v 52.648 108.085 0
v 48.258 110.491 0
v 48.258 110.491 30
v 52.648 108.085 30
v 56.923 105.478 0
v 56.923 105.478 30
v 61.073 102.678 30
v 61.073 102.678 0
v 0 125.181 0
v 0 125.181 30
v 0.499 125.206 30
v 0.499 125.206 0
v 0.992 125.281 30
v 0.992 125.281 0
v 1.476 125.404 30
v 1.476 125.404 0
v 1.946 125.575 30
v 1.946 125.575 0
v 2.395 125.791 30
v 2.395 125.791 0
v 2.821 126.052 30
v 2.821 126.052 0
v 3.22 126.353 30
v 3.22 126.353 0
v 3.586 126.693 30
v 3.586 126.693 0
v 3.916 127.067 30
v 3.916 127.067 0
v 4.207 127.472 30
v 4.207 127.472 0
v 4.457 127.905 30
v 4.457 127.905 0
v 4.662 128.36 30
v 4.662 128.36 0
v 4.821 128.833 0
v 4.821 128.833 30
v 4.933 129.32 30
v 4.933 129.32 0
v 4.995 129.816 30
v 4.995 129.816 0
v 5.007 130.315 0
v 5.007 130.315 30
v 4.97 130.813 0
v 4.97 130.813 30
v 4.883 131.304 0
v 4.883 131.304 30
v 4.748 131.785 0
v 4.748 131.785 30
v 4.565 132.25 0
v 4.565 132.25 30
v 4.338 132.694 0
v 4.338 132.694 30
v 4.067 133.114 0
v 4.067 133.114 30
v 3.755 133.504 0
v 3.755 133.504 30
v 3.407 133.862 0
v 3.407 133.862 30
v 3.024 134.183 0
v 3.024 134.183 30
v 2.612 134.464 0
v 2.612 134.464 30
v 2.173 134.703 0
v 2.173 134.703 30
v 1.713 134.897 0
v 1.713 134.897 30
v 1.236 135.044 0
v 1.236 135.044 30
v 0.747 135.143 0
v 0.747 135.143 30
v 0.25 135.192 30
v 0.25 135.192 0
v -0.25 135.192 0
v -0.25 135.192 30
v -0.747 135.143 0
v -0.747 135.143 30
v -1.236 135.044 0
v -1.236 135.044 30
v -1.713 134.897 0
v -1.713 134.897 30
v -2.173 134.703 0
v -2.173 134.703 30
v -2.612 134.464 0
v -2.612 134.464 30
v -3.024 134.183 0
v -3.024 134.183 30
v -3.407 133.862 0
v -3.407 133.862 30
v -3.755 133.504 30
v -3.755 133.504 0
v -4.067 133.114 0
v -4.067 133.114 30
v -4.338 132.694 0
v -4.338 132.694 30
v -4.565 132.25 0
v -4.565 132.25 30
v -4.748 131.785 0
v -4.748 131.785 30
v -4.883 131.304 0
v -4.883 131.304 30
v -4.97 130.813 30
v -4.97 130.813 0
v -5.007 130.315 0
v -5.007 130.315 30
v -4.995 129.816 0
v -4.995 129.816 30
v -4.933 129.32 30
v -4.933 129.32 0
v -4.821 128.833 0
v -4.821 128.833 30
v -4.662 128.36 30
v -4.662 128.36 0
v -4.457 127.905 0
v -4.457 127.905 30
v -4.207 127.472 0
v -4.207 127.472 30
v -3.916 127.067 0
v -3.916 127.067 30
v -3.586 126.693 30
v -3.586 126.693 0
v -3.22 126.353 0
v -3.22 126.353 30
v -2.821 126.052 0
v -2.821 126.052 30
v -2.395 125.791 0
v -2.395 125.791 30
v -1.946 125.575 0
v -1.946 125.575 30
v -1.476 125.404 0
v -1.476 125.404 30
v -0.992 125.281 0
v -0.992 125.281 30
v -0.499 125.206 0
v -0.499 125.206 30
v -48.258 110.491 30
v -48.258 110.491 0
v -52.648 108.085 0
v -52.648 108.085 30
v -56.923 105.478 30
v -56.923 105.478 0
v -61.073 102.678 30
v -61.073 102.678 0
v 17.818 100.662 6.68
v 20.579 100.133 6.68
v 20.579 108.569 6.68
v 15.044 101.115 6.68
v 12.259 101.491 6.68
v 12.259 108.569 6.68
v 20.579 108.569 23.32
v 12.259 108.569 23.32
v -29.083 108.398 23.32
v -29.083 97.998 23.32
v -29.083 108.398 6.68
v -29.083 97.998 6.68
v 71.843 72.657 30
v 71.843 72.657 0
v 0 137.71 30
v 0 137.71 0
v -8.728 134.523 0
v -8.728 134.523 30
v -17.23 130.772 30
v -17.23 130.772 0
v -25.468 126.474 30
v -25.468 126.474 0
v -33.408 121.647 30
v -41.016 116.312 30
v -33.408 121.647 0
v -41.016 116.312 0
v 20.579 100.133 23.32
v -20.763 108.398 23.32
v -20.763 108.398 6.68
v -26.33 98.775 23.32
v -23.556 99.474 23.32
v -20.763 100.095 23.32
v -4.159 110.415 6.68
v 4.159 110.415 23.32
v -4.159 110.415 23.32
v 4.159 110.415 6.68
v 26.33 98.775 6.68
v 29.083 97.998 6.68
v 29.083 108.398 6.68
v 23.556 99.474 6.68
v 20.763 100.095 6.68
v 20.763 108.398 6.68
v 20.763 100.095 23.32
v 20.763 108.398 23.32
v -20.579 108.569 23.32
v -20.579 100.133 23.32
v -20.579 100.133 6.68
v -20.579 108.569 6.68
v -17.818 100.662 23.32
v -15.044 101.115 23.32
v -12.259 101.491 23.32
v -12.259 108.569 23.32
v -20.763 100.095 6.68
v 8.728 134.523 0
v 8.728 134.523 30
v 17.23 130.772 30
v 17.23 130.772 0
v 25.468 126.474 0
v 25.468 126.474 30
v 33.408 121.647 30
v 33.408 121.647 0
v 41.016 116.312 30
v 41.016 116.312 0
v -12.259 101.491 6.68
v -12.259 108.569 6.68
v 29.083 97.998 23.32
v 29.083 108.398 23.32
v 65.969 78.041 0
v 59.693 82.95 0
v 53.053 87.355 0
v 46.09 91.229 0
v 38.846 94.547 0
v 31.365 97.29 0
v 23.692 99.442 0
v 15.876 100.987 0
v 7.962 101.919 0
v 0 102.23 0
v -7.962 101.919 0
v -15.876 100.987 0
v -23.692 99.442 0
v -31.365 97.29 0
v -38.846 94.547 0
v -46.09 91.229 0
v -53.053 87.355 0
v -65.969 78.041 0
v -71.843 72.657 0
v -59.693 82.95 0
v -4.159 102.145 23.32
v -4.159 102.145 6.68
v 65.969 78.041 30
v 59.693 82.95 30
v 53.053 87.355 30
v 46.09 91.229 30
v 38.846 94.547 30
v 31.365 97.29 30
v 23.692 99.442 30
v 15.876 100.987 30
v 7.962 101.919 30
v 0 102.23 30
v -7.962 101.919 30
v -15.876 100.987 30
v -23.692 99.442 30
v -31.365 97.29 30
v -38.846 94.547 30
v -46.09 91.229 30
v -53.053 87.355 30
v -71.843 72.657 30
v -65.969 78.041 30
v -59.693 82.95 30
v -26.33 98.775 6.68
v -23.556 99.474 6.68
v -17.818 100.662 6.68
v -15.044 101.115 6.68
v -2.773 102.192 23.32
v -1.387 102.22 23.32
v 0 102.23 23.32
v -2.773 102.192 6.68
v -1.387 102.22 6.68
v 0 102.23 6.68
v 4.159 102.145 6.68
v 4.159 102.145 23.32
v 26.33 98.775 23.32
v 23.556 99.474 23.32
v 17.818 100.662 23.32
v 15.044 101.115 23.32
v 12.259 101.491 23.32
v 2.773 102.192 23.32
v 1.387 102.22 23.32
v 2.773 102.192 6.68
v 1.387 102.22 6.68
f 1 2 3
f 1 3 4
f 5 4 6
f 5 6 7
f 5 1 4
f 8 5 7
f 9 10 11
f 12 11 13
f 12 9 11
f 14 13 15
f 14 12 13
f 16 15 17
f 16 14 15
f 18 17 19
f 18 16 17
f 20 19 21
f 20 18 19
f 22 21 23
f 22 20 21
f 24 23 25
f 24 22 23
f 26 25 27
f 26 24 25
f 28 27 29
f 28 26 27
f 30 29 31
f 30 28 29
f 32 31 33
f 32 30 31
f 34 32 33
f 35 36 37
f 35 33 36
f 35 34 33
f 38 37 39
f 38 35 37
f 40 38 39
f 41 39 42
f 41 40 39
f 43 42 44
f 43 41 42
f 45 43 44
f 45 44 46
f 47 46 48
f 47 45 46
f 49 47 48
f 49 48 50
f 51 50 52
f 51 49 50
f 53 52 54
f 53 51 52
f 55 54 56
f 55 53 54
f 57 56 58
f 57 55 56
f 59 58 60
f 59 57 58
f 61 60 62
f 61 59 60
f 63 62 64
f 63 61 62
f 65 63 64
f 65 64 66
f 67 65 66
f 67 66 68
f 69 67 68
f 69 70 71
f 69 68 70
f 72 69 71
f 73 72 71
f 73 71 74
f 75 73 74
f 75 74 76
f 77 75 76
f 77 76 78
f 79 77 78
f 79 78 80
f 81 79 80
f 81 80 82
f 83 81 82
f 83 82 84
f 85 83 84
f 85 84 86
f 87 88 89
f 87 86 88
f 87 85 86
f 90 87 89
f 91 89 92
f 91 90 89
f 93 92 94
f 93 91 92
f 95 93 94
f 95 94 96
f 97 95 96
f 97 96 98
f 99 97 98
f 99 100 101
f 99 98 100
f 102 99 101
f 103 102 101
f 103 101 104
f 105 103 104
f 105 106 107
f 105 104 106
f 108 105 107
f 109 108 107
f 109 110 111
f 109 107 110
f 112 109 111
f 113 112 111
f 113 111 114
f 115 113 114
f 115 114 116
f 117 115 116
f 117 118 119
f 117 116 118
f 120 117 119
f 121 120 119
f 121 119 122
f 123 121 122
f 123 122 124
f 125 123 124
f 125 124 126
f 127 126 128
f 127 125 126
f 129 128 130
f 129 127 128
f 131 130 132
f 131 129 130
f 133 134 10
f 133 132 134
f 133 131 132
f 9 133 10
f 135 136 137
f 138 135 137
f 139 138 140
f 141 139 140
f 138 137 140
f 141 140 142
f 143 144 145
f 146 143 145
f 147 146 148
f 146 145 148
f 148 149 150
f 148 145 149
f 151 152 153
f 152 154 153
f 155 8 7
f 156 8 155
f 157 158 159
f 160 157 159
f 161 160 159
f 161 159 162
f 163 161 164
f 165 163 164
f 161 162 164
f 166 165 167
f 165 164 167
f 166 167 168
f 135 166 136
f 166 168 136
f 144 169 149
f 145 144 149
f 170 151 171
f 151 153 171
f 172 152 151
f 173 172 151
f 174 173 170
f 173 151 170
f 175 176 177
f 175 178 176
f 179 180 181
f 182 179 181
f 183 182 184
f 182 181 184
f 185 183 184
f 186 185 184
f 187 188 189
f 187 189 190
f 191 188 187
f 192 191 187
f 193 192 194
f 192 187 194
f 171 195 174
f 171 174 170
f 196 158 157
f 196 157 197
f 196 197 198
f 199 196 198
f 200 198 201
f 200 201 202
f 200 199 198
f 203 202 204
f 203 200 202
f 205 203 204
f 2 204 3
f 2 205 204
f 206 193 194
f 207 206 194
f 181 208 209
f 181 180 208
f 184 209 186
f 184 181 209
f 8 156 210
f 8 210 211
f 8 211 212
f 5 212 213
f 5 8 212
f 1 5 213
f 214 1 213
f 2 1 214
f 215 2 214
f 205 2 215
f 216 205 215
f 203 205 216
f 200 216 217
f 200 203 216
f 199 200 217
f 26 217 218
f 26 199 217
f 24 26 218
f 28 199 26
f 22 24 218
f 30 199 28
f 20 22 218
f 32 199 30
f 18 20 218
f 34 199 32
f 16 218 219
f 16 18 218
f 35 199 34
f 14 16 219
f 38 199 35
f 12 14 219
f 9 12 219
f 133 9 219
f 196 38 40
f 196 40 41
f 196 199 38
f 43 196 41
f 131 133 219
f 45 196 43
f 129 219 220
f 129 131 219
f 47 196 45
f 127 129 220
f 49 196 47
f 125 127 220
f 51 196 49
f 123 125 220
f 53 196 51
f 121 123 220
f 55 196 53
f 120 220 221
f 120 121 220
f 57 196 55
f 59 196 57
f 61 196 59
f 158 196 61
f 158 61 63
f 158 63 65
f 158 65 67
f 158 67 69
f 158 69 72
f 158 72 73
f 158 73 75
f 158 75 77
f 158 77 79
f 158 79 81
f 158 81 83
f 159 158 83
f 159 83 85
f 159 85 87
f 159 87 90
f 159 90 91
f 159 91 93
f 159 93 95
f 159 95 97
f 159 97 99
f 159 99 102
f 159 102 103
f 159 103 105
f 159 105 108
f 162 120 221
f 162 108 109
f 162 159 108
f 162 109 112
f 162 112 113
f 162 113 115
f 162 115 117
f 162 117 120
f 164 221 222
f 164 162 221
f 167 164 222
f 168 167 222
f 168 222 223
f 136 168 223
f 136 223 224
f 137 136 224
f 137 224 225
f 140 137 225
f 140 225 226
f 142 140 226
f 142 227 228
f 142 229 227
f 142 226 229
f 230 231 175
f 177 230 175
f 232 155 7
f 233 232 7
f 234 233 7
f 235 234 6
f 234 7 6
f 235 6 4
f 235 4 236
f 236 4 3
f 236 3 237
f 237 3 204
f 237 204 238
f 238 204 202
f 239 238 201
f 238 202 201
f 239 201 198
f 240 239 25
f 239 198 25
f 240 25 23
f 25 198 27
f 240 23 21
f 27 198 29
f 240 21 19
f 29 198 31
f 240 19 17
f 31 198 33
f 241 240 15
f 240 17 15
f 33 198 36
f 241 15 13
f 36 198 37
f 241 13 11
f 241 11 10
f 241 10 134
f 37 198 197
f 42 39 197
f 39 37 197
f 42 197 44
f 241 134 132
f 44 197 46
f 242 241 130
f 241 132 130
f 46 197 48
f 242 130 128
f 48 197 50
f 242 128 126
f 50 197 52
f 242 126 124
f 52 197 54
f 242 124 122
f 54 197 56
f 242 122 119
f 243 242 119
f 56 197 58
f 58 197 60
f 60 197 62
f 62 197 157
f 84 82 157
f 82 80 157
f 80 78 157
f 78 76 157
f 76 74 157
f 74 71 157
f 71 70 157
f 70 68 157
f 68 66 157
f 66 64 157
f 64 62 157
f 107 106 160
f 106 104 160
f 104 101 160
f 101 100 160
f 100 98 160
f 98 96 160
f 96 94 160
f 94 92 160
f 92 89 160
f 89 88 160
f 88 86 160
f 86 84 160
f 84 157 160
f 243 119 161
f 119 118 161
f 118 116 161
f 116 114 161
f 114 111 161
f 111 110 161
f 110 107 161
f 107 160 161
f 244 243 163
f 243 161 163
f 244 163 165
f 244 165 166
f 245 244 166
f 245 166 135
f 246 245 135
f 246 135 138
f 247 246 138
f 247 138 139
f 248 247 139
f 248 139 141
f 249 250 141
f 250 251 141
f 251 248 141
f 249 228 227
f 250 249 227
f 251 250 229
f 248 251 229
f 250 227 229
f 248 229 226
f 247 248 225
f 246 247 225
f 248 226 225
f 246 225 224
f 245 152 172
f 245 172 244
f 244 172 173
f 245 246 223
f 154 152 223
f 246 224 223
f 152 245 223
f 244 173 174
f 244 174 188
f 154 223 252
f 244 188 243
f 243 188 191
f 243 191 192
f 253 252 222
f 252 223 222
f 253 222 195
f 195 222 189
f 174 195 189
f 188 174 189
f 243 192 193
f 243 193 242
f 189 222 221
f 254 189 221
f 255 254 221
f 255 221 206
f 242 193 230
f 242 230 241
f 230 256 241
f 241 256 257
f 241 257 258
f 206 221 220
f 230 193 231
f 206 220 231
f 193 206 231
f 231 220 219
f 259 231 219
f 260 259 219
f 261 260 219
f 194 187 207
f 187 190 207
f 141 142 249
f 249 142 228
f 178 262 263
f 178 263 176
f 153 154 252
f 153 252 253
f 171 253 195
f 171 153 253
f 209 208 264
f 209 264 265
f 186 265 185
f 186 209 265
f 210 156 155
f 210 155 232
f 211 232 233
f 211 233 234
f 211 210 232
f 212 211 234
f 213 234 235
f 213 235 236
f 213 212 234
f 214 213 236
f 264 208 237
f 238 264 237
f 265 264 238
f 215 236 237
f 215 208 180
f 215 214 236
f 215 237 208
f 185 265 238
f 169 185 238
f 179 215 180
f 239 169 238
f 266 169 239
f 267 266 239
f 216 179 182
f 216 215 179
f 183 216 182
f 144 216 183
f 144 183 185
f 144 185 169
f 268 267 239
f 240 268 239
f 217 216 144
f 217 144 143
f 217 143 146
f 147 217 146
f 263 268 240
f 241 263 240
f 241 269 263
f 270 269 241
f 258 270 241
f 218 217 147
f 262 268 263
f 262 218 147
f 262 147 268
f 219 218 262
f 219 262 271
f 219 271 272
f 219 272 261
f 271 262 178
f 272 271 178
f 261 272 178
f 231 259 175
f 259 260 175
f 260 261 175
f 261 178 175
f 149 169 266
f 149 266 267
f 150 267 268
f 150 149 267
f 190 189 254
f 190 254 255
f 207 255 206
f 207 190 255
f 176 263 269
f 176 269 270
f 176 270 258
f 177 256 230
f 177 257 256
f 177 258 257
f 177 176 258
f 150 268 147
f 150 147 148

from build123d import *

# Parameters (mm, degrees)
BOSS_EXTRUDE1_DEPTH     = 30
SKETCH2_W               = 8.32
SKETCH2_H               = 8.5
SKETCH2_H_2             = 10.4
SKETCH2_W_2             = 4.158973904
SKETCH2_H_3             = 8.284744262
CUT_EXTRUDE5_DEPTH      = 8.32
CUT_EXTRUDE5_DEPTH_BACK = 8.32


with BuildPart() as part:
    # Sketch1 → Boss-Extrude1 (new body)
    with BuildSketch(Plane.XY):
        with BuildLine():
            Line((-61.072637036, 102.678177008), (-71.843049169, 72.656622079))
            ThreePointArc((-71.843049169, 72.656622079), (-38.845852098, 94.547390677), (0, 102.229873289))
            Line((0, 102.229873289), (0, 122.669843323))
            ThreePointArc((0, 122.669843323), (-24.83617604, 119.381808628), (-48.25837108, 110.490937356))
            ThreePointArc((-48.25837108, 110.490937356), (-54.800605836, 106.806147253), (-61.072637036, 102.678177008))
        make_face()
        with BuildLine():
            ThreePointArc((0, 137.710014326), (-25.468170629, 126.474444633), (-48.25837108, 110.490937356))
            ThreePointArc((-48.25837108, 110.490937356), (-24.83617604, 119.381808628), (0, 122.669843323))
            Line((0, 122.669843323), (0, 125.181241323))
            ThreePointArc((0, 125.181241323), (-5.008687502, 130.189928825), (0, 135.198616327))
            Line((0, 135.198616327), (0, 137.710014326))
        make_face()
    extrude(amount=BOSS_EXTRUDE1_DEPTH)

    # Sketch2 → Cut-Extrude5 (cut, two sides)
    with BuildSketch(Plane.XY.offset(15)) as cut_extrude5_sk:
        with Locations((-16.418701703, 104.318970145)):
            Rectangle(SKETCH2_W, SKETCH2_H)
        with Locations((-24.923280466, 103.197968007)):
            Rectangle(SKETCH2_W, SKETCH2_H_2)
        with Locations((-2.079486952, 106.272425537)):
            Rectangle(SKETCH2_W_2, SKETCH2_H_3)
    extrude(amount=CUT_EXTRUDE5_DEPTH, mode=Mode.SUBTRACT)
    extrude(cut_extrude5_sk.sketch, amount=-CUT_EXTRUDE5_DEPTH_BACK, mode=Mode.SUBTRACT)

    # Mirror3: part across plane


with BuildPart() as part_1:
    add(part.part)
    add(part.part.mirror(Plane(origin=(0, 0, 30), x_dir=(0, 0, 1), z_dir=(-1, 0, 0))))


solid = part_1.part
